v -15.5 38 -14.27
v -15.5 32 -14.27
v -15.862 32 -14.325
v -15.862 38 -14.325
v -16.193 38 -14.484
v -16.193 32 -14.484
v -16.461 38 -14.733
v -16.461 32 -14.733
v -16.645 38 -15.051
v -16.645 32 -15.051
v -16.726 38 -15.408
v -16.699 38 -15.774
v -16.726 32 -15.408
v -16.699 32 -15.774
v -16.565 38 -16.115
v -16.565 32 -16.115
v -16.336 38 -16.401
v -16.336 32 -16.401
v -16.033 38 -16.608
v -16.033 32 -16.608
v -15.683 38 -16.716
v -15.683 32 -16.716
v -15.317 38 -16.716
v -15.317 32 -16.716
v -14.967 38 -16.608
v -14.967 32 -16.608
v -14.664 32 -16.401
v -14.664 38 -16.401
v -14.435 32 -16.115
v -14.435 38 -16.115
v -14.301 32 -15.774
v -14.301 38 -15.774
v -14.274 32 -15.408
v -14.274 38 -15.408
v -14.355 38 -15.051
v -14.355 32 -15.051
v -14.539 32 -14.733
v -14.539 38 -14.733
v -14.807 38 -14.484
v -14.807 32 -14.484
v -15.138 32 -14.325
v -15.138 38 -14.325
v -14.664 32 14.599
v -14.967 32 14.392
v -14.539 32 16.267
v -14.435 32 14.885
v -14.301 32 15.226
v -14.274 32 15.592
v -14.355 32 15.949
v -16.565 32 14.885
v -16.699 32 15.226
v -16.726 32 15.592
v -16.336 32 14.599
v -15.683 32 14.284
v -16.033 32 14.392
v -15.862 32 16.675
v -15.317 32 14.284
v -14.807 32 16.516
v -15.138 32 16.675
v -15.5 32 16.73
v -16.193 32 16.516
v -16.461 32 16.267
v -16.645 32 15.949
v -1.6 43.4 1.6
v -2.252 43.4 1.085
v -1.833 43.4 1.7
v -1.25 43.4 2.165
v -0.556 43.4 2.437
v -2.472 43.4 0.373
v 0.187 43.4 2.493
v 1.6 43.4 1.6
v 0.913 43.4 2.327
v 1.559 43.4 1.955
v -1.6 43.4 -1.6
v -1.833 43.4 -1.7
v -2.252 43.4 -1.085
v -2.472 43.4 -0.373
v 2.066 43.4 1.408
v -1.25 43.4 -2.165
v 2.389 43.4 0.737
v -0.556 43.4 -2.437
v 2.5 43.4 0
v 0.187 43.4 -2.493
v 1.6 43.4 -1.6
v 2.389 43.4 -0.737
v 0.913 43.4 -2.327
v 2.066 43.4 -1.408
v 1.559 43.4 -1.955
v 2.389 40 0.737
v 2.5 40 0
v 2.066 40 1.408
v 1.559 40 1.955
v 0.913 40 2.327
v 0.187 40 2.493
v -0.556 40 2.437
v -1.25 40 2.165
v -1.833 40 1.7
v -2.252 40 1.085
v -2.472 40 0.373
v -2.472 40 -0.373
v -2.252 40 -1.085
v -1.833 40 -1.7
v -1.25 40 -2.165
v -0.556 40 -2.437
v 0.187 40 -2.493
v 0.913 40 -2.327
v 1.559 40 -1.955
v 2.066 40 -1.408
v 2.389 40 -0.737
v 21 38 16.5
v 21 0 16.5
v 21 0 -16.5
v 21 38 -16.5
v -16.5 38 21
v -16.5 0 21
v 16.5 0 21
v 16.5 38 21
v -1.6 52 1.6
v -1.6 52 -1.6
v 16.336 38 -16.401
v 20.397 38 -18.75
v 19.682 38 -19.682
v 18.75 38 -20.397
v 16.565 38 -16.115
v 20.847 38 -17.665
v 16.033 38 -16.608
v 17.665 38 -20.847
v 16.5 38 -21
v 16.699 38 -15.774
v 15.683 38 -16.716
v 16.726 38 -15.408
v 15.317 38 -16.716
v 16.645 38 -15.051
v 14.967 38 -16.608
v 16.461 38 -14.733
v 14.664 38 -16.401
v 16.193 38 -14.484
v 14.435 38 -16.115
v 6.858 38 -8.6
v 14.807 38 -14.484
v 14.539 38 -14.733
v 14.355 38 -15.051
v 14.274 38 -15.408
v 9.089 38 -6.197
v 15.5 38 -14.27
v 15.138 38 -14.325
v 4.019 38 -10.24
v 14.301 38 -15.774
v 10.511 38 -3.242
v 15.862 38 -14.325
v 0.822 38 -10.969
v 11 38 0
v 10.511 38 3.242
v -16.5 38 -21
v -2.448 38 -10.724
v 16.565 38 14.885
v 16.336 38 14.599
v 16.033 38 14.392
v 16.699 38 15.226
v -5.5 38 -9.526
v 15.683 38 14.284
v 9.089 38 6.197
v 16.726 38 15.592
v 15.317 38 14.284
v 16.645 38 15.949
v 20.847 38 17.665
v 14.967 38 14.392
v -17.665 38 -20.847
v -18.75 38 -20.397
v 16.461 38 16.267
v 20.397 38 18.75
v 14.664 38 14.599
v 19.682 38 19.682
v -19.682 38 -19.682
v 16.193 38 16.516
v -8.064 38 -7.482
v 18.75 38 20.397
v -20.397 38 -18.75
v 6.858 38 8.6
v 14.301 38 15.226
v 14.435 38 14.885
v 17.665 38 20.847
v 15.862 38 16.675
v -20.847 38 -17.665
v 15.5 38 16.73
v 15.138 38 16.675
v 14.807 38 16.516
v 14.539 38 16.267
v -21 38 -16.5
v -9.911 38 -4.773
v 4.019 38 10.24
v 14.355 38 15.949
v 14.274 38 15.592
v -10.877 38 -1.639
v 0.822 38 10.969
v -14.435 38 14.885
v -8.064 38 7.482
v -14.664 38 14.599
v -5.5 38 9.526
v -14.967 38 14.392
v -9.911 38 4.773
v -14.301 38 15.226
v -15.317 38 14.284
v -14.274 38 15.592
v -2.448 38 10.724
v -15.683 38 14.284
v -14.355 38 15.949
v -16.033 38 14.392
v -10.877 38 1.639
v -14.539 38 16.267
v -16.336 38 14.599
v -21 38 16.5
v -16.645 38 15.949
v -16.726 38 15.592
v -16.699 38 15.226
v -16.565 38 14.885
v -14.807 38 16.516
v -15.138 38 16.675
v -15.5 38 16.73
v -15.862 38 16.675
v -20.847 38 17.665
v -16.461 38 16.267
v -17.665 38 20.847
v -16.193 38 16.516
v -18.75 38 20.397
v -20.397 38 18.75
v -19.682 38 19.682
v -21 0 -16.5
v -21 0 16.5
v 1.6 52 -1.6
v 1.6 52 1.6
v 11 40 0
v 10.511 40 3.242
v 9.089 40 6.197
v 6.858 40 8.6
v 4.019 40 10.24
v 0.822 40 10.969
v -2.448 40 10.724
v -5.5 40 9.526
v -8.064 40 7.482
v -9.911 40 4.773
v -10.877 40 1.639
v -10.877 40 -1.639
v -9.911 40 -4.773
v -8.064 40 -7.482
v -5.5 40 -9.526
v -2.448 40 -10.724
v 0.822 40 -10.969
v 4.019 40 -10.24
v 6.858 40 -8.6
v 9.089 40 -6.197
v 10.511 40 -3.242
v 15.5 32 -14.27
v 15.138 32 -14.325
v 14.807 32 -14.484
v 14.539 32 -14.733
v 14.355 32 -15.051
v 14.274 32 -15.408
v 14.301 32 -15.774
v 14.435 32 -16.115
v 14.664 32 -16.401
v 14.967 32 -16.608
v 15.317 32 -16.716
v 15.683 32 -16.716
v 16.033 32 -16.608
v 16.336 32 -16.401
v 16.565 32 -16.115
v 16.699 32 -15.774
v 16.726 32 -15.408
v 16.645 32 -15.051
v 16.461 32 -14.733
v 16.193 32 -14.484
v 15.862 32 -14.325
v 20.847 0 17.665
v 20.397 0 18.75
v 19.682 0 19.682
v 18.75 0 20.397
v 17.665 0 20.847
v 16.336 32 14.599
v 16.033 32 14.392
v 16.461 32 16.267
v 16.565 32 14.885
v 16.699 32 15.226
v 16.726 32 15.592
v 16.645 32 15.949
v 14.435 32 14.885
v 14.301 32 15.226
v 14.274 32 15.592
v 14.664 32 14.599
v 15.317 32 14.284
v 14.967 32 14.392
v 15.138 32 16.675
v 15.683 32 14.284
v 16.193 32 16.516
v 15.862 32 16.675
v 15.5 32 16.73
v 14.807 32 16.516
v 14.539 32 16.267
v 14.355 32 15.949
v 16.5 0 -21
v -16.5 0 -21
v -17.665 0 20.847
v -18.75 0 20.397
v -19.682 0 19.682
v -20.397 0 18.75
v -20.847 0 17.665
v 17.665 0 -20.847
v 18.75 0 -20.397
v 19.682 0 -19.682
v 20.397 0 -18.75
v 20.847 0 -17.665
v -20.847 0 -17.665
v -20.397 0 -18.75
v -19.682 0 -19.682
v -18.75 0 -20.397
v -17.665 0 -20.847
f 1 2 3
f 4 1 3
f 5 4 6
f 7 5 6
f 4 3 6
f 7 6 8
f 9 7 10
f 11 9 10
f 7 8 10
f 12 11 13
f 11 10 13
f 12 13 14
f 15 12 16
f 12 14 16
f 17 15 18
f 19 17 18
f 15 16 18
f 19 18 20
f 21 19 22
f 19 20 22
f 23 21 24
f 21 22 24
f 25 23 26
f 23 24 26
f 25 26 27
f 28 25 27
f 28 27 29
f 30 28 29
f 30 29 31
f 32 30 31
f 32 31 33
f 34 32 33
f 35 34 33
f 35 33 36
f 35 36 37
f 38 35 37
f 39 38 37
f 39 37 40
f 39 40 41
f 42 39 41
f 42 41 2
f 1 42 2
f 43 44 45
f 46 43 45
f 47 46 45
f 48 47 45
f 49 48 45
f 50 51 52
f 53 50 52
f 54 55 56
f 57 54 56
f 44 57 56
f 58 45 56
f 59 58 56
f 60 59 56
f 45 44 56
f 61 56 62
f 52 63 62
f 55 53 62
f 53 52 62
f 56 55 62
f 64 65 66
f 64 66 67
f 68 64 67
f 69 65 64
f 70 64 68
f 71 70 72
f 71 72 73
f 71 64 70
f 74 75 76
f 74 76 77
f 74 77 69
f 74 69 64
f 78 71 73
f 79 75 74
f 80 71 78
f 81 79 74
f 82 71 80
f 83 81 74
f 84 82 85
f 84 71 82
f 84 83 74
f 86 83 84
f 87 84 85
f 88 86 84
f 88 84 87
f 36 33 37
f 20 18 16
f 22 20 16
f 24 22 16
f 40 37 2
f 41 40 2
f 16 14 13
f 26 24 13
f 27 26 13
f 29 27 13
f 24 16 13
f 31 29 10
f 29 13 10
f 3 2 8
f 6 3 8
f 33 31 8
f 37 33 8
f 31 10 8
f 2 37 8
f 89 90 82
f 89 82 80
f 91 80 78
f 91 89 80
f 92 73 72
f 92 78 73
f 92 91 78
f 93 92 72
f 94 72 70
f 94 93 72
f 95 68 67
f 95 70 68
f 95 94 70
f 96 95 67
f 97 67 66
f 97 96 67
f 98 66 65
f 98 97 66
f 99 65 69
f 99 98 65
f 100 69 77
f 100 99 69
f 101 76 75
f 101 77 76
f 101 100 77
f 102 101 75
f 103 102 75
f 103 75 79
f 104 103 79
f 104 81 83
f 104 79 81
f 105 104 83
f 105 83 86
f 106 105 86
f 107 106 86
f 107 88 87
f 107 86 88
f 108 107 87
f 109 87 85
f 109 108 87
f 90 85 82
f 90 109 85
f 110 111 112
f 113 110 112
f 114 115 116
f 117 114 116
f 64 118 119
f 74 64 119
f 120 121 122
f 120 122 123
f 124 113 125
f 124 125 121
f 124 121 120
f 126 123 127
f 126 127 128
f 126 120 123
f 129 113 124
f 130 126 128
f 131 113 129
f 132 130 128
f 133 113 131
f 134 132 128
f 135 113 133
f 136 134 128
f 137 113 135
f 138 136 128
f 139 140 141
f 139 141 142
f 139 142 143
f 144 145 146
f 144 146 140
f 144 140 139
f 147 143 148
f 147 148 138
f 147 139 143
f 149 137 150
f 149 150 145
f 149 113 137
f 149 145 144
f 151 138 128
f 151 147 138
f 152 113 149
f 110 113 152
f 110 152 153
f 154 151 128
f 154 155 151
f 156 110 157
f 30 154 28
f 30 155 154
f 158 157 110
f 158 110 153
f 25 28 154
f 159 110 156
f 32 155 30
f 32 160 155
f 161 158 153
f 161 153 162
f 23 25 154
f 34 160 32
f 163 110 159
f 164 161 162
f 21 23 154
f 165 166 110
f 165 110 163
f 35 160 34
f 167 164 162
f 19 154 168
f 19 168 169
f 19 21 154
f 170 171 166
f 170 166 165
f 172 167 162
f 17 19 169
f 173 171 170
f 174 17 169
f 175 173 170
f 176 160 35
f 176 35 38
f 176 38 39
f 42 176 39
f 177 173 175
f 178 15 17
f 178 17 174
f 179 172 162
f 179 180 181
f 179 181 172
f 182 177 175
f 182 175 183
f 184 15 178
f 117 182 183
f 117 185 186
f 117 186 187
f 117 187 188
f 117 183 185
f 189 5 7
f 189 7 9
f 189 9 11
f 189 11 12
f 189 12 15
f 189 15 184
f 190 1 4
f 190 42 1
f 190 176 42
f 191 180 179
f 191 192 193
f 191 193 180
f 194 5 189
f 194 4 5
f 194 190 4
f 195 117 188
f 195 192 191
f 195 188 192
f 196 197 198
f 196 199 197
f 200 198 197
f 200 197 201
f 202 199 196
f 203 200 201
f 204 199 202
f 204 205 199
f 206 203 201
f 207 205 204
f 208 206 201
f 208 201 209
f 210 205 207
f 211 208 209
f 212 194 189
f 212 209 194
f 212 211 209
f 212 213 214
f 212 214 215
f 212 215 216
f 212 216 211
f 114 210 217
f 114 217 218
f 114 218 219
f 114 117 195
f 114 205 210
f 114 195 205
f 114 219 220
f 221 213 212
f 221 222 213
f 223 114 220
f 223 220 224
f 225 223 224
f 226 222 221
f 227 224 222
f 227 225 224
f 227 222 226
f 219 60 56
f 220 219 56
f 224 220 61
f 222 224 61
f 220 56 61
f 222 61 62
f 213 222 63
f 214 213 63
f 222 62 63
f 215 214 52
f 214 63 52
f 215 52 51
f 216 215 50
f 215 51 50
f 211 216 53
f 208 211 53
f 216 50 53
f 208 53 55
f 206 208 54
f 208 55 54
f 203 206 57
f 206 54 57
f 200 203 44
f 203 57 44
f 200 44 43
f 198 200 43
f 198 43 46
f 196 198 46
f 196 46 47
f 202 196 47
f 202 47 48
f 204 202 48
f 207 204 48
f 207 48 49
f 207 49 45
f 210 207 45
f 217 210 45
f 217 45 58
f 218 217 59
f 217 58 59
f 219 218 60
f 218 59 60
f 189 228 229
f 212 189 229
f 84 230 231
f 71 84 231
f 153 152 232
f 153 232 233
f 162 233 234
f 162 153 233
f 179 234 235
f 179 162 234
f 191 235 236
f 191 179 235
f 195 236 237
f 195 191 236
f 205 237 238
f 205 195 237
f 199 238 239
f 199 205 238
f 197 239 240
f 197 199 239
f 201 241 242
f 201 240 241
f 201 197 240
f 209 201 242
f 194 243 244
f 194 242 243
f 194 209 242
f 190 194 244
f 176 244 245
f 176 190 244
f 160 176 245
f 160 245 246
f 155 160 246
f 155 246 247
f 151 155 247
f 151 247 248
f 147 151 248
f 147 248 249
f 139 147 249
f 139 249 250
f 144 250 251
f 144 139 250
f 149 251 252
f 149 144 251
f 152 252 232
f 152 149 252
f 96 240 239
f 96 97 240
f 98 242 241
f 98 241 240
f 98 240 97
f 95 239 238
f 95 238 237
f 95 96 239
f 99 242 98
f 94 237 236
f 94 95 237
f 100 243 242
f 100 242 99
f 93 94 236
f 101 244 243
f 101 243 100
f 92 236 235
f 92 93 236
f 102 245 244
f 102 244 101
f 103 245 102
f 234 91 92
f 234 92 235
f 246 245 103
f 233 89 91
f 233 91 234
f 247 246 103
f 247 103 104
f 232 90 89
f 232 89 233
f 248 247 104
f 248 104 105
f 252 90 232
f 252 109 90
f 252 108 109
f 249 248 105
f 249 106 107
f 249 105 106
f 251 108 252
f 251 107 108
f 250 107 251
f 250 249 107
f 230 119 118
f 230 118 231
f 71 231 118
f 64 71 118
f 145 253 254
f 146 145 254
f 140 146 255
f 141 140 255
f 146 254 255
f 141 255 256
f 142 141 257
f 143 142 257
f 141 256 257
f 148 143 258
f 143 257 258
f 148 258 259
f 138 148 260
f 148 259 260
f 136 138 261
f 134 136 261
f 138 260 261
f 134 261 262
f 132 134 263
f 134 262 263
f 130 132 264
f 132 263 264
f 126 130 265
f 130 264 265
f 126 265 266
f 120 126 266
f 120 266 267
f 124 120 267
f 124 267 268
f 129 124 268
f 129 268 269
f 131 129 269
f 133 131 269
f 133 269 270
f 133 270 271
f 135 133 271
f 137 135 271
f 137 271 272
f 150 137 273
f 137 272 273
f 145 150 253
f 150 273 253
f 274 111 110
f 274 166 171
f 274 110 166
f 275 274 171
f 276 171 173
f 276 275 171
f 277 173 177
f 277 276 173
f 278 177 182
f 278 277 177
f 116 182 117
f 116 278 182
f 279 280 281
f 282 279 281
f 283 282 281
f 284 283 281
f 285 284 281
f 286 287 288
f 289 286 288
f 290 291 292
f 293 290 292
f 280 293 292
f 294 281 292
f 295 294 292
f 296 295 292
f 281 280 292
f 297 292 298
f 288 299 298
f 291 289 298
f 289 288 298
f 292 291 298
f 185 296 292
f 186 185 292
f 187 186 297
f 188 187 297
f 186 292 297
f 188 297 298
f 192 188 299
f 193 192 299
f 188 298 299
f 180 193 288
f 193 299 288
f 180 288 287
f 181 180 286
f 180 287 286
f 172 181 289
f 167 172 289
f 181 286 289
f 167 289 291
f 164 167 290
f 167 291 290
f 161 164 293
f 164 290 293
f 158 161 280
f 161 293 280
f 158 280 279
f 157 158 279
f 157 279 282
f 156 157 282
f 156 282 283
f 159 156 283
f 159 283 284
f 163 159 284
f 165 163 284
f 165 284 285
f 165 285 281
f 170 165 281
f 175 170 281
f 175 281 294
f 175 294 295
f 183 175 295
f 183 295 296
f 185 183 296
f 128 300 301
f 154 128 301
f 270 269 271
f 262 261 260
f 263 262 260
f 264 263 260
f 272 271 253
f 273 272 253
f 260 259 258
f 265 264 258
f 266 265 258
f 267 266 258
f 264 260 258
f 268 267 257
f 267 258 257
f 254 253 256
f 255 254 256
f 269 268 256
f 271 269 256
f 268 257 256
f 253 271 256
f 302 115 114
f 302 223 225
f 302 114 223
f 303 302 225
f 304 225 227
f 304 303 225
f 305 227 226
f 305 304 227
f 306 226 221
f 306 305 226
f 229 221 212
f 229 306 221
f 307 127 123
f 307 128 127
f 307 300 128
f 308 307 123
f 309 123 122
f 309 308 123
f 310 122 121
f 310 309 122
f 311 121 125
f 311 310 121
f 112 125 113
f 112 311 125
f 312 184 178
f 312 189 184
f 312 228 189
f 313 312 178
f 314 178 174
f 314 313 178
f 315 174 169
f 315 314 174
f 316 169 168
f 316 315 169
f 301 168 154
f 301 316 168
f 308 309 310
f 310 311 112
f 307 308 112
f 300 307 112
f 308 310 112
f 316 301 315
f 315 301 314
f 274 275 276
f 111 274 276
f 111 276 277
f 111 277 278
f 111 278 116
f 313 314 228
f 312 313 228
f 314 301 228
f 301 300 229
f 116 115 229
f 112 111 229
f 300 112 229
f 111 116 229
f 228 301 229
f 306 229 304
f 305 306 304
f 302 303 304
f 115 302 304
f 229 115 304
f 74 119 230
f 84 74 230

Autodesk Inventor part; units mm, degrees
ref_plane "YZ Plane" through (0, 0, 0) normal (1, 0, 0) x (0, 1, 0)
ref_plane "XZ Plane" through (0, 0, 0) normal (0, 1, 0) x (-1, 0, 0)
ref_plane "XY Plane" through (0, 0, 0) normal (0, 0, 1) x (1, 0, 0)
sketch "Sketch1" plane through (0, 0, 0) normal (0, 1, 0) x (-1, 0, 0)
  line L0 (-16.5, -21) -> (16.5, -21)
  line L1 (21, -16.5) -> (21, 16.5)
  line L2 (16.5, 21) -> (-16.5, 21)
  line L3 (-21, 16.5) -> (-21, -16.5)
  line L4 (-21, -21) -> (21, 21) construction
  line L5 (21, -21) -> (-21, 21) construction
  arc A0 (21, 16.5) -> (16.5, 21) centre (16.5, 16.5) ccw
  arc A1 (-16.5, 21) -> (-21, 16.5) centre (-16.5, 16.5) ccw
  arc A2 (-21, -16.5) -> (-16.5, -21) centre (-16.5, -16.5) ccw
  arc A3 (16.5, -21) -> (21, -16.5) centre (16.5, -16.5) ccw
  point P0 (0, 0)
  dimension "d0" = 42
  dimension "d1" = 42
  dimension "d2" = 4.5
extrude "Extrusion1" add sketch "Sketch1" along normal blind 38
sketch "Sketch2" plane through (0, 38, 0) normal (0, 1, 0) x (1, 0, 0)
  circle A0 centre (0, 0) radius 11
  dimension "d5" = 22
extrude "Extrusion2" add sketch "Sketch2" along normal blind 2
sketch "Sketch3" plane through (0, 38, 0) normal (0, 1, 0) x (1, 0, 0)
  line L0 (-15.5, -15.5) -> (15.5, -15.5) construction
  line L1 (15.5, -15.5) -> (15.5, 15.5) construction
  line L2 (15.5, 15.5) -> (-15.5, 15.5) construction
  line L3 (-15.5, 15.5) -> (-15.5, -15.5) construction
  line L4 (-15.5, -15.5) -> (15.5, 15.5) construction
  line L5 (15.5, -15.5) -> (-15.5, 15.5) construction
  point P0 (0, 0)
  dimension "d8" = 31
  dimension "d9" = 31
hole "Hole1" at (-15.5, 38, 15.5) at (-15.5, 38, -15.5) at (15.5, 38, -15.5) at (15.5, 38, 15.5) direction (0, -1, 0) diameter 2.459 depth 6 thread size "M3x0.5" class "6H" standard "ISO Metric profile"
sketch "Sketch4" plane through (0, 40, 0) normal (0, 1, 0) x (1, 0, 0)
  circle A0 centre (0, 0) radius 2.5
  dimension "d17" = 5
extrude "Extrusion3" add sketch "Sketch4" along normal blind 3.4
sketch "Sketch5" plane through (0, 43.4, 0) normal (0, 1, 0) x (1, 0, 0)
  line L0 (1.6, -1.6) -> (-1.6, -1.6)
  line L1 (-1.6, -1.6) -> (-1.6, 1.6)
  line L2 (-1.6, 1.6) -> (1.6, 1.6)
  line L3 (1.6, 1.6) -> (1.6, -1.6)
  circle A0 centre (0, 0) radius 2.5 construction
  line L4 (1.6, -1.6) -> (-1.6, 1.6) construction
  line L5 (-1.6, -1.6) -> (1.6, 1.6) construction
  circle A1 centre (0, 0) radius 2.5 construction
  circle A2 centre (0, 0) radius 11 projected
  dimension "d20" = 3.2
  dimension "d21" = 3.2
extrude "Extrusion4" add sketch "Sketch5" along normal blind 8.6 contours L0 L1 L2 L3
properties part number "stepper"
